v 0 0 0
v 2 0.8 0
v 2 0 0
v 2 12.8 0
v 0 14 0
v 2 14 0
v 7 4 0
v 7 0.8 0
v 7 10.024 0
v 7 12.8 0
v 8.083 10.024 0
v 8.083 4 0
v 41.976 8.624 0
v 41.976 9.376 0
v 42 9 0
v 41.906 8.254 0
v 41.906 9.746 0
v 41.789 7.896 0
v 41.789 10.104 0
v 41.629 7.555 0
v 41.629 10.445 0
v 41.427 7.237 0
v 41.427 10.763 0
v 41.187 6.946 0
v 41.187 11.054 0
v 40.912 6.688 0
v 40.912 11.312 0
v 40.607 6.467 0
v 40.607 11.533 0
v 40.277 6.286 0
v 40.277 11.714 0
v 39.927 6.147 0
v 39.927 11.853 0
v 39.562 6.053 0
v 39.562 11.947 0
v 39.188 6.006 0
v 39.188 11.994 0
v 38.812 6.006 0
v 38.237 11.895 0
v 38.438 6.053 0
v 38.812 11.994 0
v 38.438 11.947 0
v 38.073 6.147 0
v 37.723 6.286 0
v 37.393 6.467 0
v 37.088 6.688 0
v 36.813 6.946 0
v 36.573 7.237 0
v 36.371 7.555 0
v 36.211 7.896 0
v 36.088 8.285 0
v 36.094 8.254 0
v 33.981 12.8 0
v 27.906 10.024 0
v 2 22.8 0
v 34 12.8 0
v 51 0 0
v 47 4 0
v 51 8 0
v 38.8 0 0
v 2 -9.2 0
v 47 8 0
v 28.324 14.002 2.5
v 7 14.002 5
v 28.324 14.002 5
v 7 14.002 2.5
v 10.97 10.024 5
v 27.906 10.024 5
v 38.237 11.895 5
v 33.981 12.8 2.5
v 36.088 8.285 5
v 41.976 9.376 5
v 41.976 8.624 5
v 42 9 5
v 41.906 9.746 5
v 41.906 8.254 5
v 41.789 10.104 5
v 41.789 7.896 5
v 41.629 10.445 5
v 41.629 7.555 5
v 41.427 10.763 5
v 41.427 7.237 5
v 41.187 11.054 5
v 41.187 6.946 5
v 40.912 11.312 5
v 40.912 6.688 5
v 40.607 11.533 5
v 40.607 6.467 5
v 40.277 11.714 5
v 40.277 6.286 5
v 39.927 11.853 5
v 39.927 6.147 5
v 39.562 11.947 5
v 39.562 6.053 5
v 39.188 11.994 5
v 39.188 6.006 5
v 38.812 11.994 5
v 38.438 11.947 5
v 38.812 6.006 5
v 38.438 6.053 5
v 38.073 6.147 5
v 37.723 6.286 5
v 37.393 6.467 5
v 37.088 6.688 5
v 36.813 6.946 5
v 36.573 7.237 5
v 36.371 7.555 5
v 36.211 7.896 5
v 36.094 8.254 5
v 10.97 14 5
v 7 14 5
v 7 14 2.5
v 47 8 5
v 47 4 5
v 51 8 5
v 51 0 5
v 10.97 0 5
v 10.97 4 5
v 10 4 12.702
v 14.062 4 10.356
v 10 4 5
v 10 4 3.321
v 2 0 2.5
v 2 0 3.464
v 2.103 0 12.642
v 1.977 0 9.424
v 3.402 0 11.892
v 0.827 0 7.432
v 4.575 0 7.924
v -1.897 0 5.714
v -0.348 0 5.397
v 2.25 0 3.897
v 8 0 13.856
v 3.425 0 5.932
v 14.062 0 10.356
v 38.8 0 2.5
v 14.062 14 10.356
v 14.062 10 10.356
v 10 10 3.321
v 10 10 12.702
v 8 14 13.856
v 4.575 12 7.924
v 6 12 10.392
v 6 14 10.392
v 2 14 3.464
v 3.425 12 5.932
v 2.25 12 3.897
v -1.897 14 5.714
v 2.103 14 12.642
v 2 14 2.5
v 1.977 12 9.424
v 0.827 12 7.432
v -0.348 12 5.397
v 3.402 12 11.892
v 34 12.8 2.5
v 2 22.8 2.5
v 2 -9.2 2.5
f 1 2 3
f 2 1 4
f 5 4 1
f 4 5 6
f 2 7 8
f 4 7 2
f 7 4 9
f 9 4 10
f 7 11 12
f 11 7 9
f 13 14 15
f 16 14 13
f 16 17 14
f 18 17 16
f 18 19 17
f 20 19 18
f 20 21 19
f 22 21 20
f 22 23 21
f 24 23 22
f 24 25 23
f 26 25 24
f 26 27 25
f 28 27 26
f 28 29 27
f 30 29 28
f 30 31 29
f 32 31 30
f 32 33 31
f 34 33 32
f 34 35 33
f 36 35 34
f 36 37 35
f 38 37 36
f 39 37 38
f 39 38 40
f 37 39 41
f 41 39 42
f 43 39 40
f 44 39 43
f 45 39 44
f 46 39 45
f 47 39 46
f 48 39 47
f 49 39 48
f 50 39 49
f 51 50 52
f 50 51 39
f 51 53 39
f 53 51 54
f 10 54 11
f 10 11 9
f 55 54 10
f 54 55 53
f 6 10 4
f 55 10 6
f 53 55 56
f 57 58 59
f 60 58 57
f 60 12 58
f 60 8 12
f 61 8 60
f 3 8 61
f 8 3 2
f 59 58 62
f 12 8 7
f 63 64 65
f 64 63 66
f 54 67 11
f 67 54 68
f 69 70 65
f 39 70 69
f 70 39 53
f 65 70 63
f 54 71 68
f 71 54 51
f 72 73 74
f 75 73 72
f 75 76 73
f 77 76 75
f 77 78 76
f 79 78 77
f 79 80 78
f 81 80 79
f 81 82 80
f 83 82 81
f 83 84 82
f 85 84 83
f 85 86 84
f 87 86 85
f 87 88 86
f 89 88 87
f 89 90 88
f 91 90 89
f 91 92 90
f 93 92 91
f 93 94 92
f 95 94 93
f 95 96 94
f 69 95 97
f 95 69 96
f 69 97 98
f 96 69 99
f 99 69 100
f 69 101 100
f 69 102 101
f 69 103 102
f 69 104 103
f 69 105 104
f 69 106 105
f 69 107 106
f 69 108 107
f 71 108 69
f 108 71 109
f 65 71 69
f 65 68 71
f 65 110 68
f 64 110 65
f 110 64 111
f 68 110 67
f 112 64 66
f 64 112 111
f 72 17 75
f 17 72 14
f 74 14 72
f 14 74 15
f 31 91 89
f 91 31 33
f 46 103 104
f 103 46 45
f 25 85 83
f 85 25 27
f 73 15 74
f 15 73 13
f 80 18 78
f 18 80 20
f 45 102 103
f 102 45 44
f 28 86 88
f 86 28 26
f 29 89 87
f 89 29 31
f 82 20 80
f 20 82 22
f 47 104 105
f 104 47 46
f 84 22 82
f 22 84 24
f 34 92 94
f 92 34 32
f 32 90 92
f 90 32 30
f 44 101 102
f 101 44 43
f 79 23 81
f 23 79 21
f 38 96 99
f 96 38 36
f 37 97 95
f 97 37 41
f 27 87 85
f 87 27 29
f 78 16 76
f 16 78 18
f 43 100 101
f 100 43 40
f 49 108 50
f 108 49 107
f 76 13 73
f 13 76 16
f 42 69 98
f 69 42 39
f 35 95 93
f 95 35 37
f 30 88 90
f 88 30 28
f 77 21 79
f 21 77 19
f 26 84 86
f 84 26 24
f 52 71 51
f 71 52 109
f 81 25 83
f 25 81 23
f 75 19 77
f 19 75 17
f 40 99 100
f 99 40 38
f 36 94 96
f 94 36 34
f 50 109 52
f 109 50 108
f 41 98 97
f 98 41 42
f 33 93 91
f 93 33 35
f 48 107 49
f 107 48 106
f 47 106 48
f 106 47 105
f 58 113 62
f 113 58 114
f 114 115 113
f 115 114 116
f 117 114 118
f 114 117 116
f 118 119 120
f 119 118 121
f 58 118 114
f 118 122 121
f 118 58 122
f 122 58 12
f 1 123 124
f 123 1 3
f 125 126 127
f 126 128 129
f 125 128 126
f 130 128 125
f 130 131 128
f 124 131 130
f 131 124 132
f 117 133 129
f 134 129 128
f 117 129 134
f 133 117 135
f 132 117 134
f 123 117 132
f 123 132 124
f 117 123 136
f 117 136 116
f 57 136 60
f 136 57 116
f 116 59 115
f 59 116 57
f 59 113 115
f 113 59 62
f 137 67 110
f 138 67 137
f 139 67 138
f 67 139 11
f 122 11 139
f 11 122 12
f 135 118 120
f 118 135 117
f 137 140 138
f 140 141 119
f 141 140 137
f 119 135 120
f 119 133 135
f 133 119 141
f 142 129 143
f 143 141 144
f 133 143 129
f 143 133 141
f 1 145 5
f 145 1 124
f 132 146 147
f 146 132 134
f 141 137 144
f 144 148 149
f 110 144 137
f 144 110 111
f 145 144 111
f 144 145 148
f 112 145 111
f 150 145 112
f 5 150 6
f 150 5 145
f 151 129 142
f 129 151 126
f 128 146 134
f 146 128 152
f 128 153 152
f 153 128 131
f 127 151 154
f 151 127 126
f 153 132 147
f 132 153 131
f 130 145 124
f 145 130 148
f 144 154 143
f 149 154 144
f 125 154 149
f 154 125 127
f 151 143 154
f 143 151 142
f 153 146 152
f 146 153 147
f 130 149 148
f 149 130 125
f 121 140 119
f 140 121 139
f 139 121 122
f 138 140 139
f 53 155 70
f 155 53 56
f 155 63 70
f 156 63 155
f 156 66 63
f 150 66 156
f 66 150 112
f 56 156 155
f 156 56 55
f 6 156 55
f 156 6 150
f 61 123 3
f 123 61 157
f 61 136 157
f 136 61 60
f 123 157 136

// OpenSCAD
// Dacia Lodgy phone holder clip on ventilation flap
// Clip composé de deux bras et d'un embout incliné
// sur lequel glisser le support du smartphone

// Dimensions des bras
larg = 5; // Largeur des bras
ep = 4; // Epaisseur des bras
long1 = 40; // Longueur bras supérieur
long2 = 32; // Longueur bras inférieur
dist = 6; // distance d'écart entre les bras
d= 2*ep+dist; //  
r= d/2;
rayon=200; // Rayon de courbure du bras inférieur
rayonplus=rayon+10;
a=asin(long2/rayon); // Angle d'ouverture du bras inférieur

// Dimensions de l'Embout glissière
x1 = 7; 
x2 = 3;
x3 = 1.5;
h1 = 16;
h2 = 2.3;
h3 = 8;
y1 = d;
y2 = 2;
y3 = d;

// Bras supérieur droit
module brassup(){
   translate([r,0,0]) cube([long1,ep,larg],center=false);    
   translate([r+long1,0,0])cube([ep,2*ep,larg],center=false); 
    }
//brassup();

// Bras inférieur courbe
module brasinf(){
 translate([r+long2,0.75*ep+ dist,0]) cylinder(larg,r=0.75*ep,$fn=50);
 translate([r,-rayon+ep+dist+0.28*ep,0])
difference(){
 translate([0,0,0])
 rotate_extrude(convexity=10)
  translate([rayon, 0]) square(size = [ep, larg], center = false);
  translate([-rayonplus,-rayonplus,0])cube([rayonplus,2*rayonplus,larg], center = false);
  rotate(-a) translate([0,-rayonplus,0])cube([rayonplus,2*rayonplus,larg], center = false);  
};
}
//brasinf();

// Renfort Bras inférieur
module renfort(){
   translate([ep/2,ep+dist+0.7*ep,0])
   linear_extrude(height = larg/2) polygon([[0,0],[0,10],[long2,0]]); 
      }
//renfort();
      
// Renfort Bras supérieur
module renforts(){
   translate([ep/2,0.2*ep,0])
   linear_extrude(height = larg/2) polygon([[0,0],[0,-10],[long1,0]]); 
      }
//renforts();
      
// module clip
module clip() {
    union(){
        brasinf();
        brassup();
        }
}
//clip();

//module embout 
module embout(){
   union() {
     translate([0,0,0])cube([x1,y1,h1],center=false);
     translate([-x2,y1-y3,h1/2-h2/2])cube([x2,y3,h2],center=false);
     translate([-x2,y1-y3,h1/2-h3/2])cube([x2,y3,0.5],center=false); // cloison fine à  découper après impression  
     translate([-x2,y1-y2,h3/2])cube([x2,y2,h3],center=false);   
     translate([-x2-x3,y1-y3,h3/2])cube([x3,y3,h3],center=false);  
   }
   }
   
 // Module embout incliné
   module embouti(){
 difference(){     
  rotate([0, 30, 0]) translate([0,0,0]) embout(); // embout incliné
  translate([0,0,-4])cube([20,d,4],center=false); // embout raboté en bas
  translate([r+3,ep,0])cube([5,dist,h1],center=false); // embout raboté au milieu 
     }
 }

union(){
    clip();
    renfort();
    renforts();
    embouti();
}

// jean-Nicolas Maisonnier - 24 février 2019
